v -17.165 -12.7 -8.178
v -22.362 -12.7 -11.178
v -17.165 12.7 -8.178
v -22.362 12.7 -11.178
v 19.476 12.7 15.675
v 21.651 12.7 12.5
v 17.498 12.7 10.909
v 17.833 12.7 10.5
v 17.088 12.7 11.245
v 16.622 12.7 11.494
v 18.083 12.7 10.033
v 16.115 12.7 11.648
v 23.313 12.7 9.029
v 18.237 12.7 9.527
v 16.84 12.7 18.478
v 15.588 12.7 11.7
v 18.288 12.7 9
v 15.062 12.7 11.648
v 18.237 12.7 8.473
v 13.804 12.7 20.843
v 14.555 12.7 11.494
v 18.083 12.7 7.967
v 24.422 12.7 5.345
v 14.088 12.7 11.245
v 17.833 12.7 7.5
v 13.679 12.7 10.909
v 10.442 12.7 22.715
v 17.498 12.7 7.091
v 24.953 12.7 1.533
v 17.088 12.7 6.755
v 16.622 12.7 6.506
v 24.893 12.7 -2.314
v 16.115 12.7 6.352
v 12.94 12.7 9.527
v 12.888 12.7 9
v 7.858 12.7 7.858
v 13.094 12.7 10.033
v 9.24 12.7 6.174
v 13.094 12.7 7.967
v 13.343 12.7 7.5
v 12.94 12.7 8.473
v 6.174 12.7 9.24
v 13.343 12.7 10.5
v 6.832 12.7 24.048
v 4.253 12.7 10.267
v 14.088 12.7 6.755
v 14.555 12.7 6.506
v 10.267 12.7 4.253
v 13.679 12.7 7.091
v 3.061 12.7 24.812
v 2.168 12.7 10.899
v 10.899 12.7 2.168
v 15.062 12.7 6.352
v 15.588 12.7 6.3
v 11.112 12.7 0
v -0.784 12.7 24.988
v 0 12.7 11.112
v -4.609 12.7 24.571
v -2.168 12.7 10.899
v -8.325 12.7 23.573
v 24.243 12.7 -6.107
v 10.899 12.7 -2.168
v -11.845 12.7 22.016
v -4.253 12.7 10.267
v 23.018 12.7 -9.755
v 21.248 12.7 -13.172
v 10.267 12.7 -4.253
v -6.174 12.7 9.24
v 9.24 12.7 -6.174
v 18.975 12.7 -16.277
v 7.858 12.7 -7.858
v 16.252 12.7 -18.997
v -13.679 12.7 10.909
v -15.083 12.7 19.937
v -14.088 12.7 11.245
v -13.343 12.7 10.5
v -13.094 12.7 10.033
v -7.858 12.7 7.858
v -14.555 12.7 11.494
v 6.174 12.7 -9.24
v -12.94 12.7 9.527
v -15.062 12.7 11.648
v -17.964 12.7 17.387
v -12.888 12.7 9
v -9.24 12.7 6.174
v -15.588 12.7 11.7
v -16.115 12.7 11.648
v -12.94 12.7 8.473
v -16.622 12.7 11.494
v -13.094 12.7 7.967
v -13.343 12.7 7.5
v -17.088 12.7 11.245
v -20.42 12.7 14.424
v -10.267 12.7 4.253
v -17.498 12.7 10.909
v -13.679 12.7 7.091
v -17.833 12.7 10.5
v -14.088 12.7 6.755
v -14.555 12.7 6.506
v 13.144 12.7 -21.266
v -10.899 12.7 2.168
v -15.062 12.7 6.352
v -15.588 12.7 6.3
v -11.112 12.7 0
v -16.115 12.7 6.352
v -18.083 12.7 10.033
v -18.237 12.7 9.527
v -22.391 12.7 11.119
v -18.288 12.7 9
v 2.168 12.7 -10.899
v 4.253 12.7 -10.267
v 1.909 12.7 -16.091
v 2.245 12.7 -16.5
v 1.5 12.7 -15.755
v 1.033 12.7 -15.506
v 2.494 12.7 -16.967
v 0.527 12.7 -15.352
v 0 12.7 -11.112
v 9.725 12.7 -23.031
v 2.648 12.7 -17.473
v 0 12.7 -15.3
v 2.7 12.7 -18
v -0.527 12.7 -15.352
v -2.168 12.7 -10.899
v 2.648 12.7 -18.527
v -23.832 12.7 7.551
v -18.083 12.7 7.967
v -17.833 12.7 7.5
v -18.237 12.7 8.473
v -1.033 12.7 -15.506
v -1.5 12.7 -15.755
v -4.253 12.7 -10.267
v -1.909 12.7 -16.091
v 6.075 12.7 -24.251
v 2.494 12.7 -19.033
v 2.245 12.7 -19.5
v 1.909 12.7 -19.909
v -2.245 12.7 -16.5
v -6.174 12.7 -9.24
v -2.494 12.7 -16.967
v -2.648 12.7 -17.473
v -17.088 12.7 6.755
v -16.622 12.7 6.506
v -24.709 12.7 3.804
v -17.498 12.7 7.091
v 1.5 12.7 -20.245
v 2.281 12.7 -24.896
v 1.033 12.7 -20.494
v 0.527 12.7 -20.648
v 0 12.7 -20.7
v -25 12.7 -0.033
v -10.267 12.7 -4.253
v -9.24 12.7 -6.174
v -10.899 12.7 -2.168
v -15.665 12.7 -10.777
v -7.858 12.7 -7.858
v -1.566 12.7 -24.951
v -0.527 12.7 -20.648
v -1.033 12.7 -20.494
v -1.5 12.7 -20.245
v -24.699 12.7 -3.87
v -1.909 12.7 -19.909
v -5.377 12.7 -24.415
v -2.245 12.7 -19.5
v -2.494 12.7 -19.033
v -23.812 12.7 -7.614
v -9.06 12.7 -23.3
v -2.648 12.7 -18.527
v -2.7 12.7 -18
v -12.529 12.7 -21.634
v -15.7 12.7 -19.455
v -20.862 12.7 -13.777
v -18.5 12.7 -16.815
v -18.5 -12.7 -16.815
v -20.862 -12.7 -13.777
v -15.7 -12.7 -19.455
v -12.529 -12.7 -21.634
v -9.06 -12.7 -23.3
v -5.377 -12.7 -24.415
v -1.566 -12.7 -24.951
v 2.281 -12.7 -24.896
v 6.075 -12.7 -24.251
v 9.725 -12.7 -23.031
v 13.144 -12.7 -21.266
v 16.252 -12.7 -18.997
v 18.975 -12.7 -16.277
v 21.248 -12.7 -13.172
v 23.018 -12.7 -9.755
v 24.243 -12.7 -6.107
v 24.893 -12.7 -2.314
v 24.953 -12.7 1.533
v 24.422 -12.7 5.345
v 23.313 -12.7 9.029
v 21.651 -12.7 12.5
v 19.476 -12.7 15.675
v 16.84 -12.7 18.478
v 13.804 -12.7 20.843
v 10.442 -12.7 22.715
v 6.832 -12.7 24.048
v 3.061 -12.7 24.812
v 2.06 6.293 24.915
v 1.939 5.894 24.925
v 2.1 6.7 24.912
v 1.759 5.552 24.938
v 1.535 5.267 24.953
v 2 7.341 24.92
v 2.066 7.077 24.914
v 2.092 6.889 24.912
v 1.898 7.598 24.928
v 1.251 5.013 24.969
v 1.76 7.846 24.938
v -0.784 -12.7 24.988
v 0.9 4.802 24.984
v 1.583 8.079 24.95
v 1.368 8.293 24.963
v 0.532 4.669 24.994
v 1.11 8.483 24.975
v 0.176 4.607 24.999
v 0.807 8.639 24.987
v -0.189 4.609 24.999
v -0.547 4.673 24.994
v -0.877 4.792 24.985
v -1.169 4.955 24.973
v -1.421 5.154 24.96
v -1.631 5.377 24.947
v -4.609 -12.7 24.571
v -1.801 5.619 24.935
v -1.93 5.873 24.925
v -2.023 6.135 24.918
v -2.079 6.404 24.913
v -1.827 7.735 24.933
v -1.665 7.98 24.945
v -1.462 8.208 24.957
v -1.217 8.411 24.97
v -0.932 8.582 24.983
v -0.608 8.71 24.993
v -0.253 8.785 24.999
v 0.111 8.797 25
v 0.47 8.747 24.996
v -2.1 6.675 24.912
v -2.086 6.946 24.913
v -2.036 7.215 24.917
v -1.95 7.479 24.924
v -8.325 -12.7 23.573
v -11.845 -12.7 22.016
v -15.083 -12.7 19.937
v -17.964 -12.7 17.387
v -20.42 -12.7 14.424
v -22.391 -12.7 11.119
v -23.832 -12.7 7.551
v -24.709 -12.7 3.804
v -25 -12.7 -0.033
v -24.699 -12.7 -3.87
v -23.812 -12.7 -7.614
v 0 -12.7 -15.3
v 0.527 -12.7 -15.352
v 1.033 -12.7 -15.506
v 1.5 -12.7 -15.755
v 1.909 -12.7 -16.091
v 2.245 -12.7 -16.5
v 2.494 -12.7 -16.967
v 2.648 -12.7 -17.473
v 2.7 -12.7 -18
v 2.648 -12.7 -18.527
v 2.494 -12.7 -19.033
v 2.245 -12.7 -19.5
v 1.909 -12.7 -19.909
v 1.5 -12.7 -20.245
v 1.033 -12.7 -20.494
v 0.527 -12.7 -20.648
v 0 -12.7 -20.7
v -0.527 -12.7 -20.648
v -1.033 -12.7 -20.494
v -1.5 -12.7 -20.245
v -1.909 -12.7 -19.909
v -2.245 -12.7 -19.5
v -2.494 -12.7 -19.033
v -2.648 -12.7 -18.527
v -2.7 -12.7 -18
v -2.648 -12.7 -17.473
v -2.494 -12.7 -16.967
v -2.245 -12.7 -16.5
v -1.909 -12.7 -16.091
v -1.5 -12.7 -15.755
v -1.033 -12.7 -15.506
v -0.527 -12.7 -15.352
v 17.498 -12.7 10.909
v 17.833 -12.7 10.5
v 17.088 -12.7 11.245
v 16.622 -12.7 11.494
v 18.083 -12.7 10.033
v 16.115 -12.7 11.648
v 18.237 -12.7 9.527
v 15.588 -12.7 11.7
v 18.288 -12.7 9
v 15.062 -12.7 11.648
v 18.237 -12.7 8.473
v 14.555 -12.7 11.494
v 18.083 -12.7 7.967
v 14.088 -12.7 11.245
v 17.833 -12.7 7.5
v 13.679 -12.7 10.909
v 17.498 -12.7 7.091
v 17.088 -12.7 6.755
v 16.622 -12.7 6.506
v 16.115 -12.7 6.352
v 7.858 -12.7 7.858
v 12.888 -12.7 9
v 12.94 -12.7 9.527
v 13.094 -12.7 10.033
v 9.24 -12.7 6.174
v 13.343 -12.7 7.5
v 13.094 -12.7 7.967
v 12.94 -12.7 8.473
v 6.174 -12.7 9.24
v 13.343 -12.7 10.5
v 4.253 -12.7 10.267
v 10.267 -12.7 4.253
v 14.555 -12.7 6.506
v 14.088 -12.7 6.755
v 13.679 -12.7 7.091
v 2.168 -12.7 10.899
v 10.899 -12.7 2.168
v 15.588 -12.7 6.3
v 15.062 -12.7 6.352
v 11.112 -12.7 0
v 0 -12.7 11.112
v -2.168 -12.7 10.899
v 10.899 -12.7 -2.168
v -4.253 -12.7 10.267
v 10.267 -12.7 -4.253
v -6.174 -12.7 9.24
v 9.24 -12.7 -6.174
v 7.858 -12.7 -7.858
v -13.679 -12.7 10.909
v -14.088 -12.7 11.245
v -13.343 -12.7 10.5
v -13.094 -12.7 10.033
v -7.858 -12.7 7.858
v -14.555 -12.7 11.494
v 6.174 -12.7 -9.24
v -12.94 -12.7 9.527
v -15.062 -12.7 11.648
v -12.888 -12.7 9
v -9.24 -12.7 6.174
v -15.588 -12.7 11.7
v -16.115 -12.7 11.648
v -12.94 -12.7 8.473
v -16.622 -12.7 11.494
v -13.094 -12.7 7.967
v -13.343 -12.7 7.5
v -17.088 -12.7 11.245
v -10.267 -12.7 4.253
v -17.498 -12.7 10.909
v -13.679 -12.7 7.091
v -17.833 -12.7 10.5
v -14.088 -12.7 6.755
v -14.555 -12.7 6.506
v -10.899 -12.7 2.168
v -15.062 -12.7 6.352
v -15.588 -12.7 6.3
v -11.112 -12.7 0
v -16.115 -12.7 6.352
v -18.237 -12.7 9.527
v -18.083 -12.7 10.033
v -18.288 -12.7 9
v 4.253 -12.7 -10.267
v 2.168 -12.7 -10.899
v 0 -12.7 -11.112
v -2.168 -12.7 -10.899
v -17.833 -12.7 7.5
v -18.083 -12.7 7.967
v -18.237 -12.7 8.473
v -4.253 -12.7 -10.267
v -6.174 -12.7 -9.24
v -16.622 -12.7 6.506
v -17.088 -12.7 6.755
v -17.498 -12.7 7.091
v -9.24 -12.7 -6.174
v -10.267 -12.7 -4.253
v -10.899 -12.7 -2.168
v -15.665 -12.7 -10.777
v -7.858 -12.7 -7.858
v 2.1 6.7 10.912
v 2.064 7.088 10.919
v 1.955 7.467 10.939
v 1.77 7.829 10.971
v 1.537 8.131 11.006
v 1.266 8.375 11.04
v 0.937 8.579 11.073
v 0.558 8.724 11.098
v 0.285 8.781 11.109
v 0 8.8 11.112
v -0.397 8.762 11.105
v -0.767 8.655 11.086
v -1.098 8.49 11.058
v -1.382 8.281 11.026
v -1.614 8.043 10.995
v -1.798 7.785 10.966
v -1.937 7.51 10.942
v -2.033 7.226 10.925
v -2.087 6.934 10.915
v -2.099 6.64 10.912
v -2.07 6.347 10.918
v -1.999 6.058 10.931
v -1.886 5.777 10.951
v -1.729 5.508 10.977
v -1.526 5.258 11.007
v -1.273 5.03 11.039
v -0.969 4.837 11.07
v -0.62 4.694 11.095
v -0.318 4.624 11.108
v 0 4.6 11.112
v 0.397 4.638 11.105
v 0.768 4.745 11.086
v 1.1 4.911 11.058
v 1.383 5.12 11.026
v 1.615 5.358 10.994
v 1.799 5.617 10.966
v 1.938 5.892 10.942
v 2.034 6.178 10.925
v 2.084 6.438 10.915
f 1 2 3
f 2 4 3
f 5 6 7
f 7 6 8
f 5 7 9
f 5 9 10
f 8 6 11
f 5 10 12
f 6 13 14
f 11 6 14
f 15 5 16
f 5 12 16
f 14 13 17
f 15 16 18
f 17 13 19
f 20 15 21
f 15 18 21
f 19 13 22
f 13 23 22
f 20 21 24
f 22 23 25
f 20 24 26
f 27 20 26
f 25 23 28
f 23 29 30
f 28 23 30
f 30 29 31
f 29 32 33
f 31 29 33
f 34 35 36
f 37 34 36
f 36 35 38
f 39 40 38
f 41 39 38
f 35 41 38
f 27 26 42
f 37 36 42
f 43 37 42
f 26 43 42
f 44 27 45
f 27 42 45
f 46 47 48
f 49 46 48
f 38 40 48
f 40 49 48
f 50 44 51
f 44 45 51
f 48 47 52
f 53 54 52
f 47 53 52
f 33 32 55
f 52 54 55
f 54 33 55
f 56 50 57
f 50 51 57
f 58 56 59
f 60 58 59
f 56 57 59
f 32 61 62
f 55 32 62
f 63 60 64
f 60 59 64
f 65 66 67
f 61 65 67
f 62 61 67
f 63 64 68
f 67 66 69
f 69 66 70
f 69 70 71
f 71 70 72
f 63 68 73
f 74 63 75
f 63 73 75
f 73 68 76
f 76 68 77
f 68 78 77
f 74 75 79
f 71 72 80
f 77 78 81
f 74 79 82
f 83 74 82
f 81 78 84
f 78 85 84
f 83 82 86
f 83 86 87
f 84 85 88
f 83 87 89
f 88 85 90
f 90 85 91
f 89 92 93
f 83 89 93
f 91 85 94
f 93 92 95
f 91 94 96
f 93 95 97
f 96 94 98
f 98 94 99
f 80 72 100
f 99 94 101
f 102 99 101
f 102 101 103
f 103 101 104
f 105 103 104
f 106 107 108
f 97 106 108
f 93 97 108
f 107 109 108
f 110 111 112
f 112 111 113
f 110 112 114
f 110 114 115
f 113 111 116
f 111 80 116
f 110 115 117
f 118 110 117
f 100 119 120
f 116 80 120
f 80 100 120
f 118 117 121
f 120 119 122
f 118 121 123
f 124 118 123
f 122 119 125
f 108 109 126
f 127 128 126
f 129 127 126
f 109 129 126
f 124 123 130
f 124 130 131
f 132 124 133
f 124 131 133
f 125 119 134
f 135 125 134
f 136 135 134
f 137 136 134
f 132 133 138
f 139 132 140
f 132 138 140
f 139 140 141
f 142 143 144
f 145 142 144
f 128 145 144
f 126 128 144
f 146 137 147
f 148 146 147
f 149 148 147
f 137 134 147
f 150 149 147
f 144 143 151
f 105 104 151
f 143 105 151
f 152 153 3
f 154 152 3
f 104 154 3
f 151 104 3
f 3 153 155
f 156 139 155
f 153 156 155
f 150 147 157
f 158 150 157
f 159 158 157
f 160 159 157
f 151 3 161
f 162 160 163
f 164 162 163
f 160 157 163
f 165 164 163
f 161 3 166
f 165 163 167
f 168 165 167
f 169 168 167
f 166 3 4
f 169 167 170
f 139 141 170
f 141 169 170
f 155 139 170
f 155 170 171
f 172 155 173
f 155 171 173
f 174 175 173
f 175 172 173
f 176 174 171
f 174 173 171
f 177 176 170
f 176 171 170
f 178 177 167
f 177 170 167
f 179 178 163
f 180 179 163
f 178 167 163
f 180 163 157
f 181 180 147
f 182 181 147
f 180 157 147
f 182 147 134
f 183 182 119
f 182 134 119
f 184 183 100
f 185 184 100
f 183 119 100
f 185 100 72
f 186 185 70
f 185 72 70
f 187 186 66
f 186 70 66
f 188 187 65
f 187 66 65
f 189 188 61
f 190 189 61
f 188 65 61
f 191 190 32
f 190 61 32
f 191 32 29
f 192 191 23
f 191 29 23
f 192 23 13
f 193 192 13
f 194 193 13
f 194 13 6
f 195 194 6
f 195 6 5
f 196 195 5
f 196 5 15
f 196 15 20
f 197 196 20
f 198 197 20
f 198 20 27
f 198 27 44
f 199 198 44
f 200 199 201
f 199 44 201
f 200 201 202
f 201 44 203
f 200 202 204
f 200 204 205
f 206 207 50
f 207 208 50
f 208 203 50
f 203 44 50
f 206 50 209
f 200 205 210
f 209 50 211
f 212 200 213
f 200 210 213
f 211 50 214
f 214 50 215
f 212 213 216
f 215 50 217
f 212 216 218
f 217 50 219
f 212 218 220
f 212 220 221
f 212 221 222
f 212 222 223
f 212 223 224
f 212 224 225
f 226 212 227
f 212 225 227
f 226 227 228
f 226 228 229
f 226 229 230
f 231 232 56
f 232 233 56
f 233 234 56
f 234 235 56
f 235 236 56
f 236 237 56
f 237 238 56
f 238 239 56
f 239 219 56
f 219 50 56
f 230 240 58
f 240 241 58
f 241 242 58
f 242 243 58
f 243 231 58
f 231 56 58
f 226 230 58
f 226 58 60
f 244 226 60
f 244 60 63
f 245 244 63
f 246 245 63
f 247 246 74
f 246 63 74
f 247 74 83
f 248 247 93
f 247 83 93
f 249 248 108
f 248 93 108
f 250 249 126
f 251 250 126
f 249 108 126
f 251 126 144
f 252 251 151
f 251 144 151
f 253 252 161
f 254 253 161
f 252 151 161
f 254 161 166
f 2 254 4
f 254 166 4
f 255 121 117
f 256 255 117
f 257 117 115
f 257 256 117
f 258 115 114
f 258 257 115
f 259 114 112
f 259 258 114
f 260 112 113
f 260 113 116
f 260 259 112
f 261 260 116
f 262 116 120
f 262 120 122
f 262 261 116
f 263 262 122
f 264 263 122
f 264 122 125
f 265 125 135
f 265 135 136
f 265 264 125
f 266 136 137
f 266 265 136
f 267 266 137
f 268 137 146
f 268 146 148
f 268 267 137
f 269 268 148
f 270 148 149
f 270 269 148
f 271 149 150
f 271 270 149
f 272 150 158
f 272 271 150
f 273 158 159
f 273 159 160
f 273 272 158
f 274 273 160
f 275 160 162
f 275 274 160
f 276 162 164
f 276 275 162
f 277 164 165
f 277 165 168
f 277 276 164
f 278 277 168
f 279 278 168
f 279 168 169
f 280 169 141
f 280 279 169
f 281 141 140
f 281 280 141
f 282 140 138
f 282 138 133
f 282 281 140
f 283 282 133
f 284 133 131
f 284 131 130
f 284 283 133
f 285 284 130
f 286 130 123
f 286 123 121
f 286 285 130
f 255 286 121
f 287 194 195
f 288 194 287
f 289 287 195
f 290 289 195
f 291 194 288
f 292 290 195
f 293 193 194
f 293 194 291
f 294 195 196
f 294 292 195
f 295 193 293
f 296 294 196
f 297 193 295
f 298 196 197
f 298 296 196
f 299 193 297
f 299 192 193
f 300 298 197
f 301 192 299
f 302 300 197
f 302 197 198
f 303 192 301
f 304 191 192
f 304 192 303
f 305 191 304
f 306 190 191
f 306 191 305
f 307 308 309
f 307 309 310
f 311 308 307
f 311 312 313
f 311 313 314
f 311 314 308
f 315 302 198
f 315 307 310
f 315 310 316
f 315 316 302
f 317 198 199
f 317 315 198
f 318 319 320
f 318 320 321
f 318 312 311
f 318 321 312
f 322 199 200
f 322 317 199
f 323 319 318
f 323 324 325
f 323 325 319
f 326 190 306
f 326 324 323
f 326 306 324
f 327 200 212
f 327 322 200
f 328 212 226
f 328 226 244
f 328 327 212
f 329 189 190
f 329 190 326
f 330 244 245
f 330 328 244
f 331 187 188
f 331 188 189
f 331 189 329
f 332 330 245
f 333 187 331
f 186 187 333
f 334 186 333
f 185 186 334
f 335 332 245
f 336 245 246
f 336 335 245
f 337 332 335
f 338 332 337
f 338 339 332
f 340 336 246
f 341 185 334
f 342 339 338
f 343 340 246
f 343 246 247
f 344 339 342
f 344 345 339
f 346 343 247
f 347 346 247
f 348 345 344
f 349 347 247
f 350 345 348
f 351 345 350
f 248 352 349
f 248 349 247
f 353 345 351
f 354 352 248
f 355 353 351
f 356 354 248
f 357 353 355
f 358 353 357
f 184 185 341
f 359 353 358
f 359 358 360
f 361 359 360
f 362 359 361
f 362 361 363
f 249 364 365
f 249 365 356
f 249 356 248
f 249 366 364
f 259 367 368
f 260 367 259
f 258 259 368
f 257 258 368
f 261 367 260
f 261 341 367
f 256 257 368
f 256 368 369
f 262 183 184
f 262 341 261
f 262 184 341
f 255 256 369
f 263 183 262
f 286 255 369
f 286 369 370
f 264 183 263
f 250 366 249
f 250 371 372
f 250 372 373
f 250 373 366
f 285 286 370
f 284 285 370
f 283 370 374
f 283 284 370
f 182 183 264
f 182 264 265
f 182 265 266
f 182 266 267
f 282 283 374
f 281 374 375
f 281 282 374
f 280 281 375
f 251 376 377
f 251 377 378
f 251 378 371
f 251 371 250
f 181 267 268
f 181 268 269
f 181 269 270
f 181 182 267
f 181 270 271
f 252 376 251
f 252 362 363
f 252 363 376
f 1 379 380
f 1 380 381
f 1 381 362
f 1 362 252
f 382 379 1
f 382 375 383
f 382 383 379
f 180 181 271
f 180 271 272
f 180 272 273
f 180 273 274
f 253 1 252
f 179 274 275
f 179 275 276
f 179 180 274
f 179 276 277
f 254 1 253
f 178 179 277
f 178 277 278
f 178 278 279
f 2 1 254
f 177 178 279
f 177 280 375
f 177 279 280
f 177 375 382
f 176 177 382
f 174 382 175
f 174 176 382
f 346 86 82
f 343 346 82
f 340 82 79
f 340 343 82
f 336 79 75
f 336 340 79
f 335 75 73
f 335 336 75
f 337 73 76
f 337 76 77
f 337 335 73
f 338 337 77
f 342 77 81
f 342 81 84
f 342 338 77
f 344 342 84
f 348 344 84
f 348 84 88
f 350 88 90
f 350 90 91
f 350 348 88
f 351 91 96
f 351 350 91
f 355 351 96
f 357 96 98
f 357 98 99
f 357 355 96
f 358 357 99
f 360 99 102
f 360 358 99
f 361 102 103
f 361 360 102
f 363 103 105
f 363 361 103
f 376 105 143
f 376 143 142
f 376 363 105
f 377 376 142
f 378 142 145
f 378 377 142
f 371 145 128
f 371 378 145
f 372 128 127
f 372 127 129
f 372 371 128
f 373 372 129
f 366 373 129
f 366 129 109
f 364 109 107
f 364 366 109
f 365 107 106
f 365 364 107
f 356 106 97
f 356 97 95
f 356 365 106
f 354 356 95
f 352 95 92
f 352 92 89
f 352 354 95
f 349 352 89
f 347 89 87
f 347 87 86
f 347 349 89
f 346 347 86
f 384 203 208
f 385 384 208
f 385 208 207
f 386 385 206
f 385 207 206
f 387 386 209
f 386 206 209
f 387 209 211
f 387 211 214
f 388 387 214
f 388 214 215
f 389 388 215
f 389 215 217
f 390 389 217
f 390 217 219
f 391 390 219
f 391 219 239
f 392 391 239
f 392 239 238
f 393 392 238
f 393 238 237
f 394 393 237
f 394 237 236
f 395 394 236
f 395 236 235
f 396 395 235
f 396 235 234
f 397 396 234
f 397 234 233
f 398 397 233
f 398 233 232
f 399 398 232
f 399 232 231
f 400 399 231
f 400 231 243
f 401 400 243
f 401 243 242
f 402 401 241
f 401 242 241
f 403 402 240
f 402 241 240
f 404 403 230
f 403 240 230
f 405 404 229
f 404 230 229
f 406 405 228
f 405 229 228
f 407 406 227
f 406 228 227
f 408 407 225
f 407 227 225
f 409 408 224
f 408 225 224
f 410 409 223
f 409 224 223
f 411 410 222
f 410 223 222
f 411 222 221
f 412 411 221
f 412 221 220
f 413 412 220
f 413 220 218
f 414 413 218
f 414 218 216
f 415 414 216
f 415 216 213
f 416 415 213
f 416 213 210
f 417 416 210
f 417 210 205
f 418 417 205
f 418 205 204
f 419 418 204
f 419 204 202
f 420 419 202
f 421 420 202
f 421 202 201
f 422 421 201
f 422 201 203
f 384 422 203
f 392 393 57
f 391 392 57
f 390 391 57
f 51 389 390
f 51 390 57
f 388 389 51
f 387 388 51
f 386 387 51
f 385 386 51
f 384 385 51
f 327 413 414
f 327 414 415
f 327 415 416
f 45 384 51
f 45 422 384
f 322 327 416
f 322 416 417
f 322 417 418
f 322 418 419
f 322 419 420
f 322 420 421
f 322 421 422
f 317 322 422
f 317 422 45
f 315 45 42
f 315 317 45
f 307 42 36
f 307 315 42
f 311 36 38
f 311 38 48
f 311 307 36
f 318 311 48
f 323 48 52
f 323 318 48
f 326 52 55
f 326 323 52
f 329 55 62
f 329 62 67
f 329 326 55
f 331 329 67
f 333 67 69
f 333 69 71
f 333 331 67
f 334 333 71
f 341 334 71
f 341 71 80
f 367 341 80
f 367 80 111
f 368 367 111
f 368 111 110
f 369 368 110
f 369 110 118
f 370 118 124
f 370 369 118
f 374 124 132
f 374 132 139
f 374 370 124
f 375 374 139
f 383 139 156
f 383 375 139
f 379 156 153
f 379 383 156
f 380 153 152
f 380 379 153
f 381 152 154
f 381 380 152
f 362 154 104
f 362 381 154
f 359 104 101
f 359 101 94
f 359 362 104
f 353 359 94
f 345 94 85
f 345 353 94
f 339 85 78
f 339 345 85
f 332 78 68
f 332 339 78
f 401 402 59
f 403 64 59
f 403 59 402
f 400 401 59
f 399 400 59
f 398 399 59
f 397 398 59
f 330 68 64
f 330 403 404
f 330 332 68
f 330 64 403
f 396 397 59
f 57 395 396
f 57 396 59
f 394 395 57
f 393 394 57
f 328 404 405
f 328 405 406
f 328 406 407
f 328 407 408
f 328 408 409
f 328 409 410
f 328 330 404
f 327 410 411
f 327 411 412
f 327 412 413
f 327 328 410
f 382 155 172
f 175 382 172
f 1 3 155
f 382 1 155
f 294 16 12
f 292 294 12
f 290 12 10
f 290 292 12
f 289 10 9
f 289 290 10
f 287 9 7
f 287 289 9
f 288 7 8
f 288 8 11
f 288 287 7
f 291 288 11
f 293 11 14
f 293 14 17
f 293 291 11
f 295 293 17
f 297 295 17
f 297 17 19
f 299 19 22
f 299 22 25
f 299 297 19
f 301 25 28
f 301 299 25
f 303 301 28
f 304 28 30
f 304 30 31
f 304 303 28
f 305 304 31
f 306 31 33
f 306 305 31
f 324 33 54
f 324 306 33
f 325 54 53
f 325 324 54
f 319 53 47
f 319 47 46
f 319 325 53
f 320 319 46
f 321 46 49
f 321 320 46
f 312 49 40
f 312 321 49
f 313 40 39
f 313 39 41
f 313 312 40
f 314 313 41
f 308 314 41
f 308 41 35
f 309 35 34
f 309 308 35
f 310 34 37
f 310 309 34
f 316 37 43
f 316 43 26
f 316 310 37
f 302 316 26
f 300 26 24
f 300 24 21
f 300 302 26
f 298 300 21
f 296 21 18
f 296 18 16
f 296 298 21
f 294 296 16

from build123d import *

# Parameters (mm, degrees)
SKETCH1_R                  = 11.1125
SKETCH1_R_2                = 2.7
BOSS_EXTRUDE1_DEPTH        = 12.7
M5X0_8_TAPPED_HOLE1_REACH  = 61.172
M5X0_8_TAPPED_HOLE1_BORE_R = 2.1


with BuildPart() as part:
    # Sketch1 → Boss-Extrude1 (new, symmetric)
    with BuildSketch(Plane(origin=(0, 0, 0), x_dir=(1, 0, 0), z_dir=(0, 1, 0))):
        with BuildLine():
            Line((-15.665476391, 10.776517819), (-20.861628814, 13.776517819))
            ThreePointArc((-20.861628814, 13.776517819), (21.650635095, -12.5), (-22.361628814, 11.178441608))
            Line((-22.361628814, 11.178441608), (-17.165476391, 8.178441608))
            Line((-17.165476391, 8.178441608), (-15.665476391, 10.776517819))
        make_face()
        with Locations(Location((0, 0, 0), (0, 0, 270))):
            Circle(SKETCH1_R, mode=Mode.SUBTRACT)
        with Locations(Location((0, 18, 0), (0, 0, 270))):
            Circle(SKETCH1_R_2, mode=Mode.SUBTRACT)
        with Locations(Location((15.588457268, -9, 0), (0, 0, 270))):
            Circle(SKETCH1_R_2, mode=Mode.SUBTRACT)
        with Locations(Location((-15.588457268, -9, 0), (0, 0, 270))):
            Circle(SKETCH1_R_2, mode=Mode.SUBTRACT)
    extrude(amount=BOSS_EXTRUDE1_DEPTH, both=True)

    # M5x0.8 Tapped Hole1 bore (on position points) → M5x0.8 Tapped Hole1 (cut, up to next)
    with BuildSketch(Plane(origin=(0, 6.7, 25), x_dir=(1, 0, 0), z_dir=(0, 0, 1)), mode=Mode.PRIVATE) as m5x0_8_tapped_hole1_sk1:
        Circle(M5X0_8_TAPPED_HOLE1_BORE_R)
    m5x0_8_tapped_hole1_tool1 = extrude(m5x0_8_tapped_hole1_sk1.sketch, amount=-M5X0_8_TAPPED_HOLE1_REACH, mode=Mode.PRIVATE) & part.part
    add(m5x0_8_tapped_hole1_tool1.solids().sort_by_distance((0, 6.7, 25))[0], mode=Mode.SUBTRACT)


solid = part.part
